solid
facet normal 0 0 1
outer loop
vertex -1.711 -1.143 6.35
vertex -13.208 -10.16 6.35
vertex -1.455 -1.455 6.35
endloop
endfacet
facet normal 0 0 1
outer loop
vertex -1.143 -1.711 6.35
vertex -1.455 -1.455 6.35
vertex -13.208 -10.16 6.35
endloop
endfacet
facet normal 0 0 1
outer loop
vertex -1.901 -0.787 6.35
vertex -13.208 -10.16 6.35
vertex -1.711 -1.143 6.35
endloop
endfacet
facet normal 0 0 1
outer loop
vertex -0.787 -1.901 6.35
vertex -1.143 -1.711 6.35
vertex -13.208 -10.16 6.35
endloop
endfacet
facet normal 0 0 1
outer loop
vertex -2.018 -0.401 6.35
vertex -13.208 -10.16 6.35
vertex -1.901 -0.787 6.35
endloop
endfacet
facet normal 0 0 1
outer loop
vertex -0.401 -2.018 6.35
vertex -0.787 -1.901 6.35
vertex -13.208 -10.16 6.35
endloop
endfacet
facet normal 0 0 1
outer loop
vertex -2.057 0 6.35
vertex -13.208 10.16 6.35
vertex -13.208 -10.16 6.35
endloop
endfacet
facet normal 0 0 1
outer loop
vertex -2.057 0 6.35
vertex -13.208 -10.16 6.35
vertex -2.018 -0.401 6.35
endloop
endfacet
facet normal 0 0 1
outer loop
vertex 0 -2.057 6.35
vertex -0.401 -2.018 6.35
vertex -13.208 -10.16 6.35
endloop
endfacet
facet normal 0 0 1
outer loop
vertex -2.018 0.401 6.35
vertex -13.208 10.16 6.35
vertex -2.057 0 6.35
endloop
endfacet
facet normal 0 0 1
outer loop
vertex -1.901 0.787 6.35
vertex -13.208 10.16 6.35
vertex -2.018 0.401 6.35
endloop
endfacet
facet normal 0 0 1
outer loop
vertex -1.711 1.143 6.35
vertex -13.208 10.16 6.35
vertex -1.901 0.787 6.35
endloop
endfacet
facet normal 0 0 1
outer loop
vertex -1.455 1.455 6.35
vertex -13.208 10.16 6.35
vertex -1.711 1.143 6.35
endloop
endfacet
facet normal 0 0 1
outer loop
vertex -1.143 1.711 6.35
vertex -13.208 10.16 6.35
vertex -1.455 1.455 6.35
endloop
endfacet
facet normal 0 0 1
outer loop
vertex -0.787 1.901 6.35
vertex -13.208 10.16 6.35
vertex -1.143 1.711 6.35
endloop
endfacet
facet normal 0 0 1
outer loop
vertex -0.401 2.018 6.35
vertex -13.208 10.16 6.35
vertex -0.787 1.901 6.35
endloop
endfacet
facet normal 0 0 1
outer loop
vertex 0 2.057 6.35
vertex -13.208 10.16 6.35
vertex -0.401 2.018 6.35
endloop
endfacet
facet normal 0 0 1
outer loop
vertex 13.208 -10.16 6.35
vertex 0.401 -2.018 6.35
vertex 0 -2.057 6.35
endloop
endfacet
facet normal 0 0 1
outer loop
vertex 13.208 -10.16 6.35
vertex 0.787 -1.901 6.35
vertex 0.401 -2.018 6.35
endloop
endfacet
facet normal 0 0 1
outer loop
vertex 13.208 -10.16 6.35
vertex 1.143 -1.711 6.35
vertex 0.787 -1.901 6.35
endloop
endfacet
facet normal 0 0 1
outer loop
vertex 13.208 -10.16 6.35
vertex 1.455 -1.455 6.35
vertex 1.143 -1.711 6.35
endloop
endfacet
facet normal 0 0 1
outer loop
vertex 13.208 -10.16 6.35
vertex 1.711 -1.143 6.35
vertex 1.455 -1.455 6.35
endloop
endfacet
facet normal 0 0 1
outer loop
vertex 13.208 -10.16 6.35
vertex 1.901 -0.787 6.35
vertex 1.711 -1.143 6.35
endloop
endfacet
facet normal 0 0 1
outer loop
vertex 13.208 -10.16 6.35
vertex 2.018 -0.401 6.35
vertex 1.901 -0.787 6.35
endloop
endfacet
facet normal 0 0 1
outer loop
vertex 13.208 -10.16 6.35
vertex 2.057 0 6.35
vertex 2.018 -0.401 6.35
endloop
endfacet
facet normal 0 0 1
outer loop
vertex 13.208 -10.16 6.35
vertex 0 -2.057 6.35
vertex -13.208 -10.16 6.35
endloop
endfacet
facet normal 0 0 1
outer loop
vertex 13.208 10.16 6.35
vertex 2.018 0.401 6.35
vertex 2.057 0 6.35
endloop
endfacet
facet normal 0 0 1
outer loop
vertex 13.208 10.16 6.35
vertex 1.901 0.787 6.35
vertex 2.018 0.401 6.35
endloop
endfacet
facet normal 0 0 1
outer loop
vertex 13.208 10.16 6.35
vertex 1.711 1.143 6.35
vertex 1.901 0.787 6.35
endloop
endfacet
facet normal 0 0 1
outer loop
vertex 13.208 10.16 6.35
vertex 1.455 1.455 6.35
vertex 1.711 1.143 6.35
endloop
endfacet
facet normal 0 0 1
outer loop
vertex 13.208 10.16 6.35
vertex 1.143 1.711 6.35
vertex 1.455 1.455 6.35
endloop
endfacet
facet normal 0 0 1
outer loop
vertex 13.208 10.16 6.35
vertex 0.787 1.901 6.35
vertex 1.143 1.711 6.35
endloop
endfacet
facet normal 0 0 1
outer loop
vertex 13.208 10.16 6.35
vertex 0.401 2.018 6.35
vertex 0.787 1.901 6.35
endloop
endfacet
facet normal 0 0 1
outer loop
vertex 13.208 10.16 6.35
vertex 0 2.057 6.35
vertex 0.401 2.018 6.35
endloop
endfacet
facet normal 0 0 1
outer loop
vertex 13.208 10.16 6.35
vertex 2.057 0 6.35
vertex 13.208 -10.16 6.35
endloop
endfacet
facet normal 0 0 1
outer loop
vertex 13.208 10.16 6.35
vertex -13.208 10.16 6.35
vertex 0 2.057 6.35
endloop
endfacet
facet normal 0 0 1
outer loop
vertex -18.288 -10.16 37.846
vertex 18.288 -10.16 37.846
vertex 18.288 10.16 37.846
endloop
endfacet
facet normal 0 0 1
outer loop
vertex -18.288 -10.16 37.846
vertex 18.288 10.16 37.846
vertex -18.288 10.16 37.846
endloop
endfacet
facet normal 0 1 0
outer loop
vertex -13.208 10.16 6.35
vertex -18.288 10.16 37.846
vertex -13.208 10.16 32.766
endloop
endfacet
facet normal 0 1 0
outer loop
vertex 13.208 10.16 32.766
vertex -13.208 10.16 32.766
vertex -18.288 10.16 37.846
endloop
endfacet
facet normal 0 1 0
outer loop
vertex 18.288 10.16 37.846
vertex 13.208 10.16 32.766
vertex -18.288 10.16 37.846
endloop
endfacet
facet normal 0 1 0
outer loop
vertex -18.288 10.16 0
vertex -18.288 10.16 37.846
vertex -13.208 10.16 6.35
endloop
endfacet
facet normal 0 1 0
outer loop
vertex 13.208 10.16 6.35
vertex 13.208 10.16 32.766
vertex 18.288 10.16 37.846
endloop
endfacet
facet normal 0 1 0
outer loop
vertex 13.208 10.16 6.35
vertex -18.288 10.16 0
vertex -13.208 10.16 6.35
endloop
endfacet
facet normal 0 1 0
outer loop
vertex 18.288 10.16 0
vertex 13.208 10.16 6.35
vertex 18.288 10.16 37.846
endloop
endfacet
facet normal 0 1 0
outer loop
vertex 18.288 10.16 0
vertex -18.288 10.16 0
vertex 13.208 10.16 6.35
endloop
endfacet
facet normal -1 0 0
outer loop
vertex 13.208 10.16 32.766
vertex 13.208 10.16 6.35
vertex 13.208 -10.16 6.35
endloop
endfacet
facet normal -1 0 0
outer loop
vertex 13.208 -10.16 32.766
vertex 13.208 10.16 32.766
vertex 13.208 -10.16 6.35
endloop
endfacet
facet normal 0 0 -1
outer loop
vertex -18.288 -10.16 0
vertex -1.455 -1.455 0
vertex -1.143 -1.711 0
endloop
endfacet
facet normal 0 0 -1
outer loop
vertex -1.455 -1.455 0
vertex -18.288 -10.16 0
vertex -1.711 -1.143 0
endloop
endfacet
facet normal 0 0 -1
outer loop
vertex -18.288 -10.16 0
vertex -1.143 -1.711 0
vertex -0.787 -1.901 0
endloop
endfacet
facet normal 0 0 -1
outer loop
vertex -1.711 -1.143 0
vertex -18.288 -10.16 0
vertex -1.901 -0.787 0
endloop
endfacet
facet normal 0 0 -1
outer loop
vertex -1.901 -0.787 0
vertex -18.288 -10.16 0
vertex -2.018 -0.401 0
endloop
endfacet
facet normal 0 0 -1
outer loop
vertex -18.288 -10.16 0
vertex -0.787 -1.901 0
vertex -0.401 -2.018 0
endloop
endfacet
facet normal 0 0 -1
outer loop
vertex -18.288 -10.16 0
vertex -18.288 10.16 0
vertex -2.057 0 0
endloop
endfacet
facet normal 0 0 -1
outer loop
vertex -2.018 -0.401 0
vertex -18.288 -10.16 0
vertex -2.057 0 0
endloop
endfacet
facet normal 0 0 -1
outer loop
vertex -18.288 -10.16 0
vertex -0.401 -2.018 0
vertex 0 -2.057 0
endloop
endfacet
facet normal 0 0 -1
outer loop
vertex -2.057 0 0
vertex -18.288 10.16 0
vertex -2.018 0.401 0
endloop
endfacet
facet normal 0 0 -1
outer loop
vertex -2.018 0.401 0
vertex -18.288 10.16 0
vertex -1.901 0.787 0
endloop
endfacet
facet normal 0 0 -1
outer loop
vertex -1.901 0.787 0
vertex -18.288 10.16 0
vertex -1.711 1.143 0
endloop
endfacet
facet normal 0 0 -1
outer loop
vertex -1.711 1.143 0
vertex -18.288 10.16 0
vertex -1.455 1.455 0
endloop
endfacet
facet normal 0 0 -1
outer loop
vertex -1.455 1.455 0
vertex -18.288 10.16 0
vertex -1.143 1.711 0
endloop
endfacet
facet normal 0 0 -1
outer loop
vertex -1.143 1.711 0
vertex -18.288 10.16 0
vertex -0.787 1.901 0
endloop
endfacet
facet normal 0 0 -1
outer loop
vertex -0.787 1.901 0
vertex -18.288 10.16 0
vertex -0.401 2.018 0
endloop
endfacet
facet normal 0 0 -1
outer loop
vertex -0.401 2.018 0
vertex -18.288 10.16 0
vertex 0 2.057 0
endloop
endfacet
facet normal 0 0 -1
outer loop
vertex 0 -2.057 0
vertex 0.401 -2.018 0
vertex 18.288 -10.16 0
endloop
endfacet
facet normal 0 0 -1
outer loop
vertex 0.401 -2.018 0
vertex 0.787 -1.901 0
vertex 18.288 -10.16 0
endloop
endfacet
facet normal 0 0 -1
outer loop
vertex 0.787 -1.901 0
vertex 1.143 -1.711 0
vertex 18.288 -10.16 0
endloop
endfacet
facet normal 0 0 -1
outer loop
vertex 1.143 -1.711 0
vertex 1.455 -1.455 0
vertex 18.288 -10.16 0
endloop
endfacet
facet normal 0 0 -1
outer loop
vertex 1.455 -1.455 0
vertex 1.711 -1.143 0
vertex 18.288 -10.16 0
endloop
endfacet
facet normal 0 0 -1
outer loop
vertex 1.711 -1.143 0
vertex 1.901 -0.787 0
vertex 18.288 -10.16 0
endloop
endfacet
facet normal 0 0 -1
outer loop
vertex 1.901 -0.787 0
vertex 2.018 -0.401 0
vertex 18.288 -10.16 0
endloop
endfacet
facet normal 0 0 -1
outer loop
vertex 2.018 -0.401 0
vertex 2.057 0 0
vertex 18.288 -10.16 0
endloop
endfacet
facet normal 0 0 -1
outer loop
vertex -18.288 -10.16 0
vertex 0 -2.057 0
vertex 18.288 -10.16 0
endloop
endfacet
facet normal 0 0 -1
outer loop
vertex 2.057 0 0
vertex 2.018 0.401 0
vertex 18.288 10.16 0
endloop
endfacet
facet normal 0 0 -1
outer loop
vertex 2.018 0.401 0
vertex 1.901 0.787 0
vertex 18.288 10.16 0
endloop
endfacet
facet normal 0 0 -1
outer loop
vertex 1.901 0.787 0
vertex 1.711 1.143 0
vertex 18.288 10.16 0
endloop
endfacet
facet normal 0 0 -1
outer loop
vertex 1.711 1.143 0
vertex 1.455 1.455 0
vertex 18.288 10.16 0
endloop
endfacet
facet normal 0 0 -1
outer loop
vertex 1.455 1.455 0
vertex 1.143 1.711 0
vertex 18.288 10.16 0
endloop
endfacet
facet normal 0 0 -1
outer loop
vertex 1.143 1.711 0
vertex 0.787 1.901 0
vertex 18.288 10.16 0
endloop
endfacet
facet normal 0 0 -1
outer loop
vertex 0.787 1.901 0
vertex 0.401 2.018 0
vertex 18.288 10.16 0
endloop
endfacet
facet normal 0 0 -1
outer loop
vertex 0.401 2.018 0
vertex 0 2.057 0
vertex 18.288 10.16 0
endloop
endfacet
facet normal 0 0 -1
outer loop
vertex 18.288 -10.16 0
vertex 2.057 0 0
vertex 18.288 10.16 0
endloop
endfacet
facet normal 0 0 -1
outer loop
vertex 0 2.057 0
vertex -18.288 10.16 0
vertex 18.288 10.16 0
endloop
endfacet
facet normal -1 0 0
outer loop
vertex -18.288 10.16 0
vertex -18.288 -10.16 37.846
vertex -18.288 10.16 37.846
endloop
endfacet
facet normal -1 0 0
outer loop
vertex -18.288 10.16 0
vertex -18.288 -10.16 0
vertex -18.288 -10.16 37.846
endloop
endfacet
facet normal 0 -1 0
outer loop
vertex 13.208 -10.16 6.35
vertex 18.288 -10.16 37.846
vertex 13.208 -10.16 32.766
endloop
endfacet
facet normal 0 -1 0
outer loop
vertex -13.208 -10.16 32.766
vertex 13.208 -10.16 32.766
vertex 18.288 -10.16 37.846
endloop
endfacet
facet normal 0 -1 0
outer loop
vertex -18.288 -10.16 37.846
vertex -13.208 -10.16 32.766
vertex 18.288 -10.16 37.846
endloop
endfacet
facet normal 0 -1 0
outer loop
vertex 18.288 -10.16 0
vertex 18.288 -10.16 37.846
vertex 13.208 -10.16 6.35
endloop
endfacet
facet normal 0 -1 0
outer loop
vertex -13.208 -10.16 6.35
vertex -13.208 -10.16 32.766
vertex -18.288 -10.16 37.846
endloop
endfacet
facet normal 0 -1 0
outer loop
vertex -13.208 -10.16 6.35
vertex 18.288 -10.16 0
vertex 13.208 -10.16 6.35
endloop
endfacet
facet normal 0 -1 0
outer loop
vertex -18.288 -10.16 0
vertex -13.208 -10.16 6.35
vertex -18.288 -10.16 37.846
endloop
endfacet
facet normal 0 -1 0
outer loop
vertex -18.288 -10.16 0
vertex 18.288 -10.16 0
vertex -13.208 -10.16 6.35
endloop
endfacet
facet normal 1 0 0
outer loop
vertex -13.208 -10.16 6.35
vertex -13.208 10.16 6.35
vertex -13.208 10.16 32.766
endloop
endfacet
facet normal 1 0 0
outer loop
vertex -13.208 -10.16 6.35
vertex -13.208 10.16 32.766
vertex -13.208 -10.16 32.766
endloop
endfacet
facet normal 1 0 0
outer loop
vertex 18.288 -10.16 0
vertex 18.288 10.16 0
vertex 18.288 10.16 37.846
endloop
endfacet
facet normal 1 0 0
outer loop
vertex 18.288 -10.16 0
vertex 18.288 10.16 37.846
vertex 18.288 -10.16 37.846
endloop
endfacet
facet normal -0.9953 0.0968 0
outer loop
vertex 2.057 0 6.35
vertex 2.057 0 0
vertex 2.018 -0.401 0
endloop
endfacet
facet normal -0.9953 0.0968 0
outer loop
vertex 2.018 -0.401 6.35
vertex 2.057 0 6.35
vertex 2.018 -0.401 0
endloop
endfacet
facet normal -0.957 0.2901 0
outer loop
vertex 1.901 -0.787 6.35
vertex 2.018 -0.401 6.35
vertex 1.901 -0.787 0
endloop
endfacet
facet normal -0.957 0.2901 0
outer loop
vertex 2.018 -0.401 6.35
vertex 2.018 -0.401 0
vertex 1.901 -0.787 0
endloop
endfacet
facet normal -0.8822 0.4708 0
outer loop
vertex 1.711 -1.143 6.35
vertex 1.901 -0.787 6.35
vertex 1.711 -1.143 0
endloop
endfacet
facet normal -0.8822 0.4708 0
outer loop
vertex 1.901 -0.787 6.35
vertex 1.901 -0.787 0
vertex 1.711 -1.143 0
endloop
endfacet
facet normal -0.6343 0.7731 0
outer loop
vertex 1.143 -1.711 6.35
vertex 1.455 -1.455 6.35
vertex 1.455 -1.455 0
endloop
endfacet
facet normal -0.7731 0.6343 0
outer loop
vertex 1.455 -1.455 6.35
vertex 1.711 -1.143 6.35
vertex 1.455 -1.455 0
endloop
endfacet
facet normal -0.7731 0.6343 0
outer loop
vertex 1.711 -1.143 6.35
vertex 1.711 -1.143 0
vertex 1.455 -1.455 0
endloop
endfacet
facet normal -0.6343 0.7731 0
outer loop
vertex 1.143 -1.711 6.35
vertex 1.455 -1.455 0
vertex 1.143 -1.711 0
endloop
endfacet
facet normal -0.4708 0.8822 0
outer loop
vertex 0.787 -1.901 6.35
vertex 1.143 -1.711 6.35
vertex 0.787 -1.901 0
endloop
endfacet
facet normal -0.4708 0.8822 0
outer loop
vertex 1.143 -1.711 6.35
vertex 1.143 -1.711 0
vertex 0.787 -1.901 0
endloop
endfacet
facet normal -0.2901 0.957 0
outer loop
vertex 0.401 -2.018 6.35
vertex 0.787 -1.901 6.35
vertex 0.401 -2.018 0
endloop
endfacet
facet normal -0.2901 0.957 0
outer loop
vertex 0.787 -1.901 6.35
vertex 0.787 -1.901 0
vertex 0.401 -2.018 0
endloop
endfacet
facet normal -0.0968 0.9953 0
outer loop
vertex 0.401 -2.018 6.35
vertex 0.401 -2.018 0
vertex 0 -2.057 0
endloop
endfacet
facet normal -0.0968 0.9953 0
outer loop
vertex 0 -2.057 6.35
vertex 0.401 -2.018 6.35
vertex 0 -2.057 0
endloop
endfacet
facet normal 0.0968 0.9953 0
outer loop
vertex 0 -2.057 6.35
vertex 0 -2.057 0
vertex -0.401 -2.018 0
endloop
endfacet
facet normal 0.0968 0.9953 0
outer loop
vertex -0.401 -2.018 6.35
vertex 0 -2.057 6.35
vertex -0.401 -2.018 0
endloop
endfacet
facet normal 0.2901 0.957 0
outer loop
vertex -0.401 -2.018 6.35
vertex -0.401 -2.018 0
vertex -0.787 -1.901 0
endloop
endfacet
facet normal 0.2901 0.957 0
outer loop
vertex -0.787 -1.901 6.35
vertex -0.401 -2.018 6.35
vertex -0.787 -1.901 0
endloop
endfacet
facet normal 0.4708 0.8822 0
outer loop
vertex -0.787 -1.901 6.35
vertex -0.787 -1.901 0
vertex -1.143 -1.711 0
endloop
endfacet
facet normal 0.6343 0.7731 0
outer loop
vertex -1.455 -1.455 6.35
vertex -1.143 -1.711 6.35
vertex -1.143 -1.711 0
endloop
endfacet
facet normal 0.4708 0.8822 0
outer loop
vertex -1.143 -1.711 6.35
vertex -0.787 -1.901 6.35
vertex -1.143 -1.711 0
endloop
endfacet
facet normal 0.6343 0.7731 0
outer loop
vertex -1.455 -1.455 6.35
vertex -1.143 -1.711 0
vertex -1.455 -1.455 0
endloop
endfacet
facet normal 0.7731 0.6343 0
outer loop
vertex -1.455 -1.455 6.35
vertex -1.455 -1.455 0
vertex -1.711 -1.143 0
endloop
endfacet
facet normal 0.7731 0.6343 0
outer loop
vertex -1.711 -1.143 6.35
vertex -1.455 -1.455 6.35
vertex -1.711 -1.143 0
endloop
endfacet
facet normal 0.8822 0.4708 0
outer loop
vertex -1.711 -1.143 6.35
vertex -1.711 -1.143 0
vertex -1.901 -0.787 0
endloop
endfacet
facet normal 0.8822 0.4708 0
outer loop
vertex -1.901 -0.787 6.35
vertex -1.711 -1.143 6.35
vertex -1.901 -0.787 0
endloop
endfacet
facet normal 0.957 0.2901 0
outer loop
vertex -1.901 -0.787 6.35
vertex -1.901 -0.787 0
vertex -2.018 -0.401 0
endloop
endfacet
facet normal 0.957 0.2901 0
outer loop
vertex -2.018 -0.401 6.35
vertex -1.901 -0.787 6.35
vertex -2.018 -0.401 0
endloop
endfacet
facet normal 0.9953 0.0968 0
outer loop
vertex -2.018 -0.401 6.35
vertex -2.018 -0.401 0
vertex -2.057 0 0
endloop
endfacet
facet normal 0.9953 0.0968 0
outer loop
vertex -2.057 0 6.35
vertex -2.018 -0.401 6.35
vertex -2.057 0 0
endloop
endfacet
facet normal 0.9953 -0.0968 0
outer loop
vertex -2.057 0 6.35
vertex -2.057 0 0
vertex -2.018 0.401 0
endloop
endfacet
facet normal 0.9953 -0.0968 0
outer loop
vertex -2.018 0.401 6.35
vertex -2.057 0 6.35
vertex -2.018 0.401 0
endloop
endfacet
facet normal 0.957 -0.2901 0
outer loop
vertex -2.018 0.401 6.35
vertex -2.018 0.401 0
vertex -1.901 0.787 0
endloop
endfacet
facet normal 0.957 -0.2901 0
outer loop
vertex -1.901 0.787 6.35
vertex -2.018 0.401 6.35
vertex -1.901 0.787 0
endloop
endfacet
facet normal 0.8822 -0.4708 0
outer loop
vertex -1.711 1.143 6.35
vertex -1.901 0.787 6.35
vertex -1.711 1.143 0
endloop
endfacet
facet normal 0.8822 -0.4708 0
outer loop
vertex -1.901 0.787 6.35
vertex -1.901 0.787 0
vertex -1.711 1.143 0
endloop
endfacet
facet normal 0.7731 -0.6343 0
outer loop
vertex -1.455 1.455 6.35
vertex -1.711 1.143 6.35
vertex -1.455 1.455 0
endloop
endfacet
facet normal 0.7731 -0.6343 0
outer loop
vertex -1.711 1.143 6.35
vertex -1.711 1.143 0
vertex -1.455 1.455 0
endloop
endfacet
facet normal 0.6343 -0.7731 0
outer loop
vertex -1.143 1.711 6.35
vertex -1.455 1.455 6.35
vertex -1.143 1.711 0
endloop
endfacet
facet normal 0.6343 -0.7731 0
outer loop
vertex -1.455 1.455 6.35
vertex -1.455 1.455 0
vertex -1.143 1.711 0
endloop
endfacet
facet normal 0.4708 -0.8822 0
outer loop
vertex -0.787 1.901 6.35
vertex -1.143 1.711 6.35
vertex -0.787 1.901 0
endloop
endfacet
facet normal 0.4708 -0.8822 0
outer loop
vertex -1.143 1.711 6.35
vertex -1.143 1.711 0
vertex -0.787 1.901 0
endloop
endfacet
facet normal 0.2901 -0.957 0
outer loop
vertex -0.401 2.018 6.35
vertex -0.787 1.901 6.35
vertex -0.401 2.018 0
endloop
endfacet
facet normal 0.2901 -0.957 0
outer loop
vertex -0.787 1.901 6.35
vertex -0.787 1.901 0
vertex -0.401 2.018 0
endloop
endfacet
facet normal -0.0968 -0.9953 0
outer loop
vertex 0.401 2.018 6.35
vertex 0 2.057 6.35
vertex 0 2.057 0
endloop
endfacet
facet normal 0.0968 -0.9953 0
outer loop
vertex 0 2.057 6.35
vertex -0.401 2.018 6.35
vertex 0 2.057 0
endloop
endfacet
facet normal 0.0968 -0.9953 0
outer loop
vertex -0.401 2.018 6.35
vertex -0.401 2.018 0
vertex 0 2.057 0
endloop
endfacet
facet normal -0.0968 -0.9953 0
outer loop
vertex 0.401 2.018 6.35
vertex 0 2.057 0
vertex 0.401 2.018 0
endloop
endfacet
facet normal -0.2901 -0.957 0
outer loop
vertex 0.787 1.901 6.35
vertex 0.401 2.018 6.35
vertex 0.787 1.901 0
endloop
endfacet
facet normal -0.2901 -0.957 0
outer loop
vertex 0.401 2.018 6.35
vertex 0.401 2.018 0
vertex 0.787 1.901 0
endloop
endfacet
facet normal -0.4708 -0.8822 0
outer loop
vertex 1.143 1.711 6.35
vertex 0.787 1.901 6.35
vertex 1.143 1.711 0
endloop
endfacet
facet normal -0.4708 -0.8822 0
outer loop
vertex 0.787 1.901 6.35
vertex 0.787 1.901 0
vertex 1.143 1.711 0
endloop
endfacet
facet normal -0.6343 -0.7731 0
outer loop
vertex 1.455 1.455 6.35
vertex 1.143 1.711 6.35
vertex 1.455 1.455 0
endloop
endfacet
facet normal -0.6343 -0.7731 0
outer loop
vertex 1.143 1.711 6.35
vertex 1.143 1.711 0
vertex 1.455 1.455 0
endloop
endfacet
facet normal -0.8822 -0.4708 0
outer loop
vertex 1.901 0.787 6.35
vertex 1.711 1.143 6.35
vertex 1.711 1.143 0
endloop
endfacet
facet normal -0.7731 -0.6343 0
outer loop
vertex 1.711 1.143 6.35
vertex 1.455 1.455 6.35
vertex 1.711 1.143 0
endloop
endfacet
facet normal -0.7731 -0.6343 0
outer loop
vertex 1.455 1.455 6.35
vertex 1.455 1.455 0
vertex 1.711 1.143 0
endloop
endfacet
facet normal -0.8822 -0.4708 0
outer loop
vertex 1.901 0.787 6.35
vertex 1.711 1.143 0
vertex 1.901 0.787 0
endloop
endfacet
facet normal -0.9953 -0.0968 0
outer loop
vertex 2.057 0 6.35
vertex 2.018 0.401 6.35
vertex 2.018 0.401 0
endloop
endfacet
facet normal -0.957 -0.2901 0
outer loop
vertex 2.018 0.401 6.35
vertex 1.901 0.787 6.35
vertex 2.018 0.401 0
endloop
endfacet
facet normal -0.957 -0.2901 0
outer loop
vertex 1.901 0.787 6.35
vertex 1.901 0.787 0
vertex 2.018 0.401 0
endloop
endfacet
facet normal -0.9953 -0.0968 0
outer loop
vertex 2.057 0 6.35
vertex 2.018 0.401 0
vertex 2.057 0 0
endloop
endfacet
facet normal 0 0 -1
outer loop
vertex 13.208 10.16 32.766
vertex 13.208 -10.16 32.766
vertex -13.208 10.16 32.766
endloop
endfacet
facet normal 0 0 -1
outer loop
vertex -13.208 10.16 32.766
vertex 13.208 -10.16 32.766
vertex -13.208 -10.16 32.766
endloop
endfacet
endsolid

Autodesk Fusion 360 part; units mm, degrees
sketch "Sketch1" plane through (0, 0, 0) normal (0, 0, 1) x (1, 0, 0)
  line L0 (18.288, -10.16) -> (-18.288, -10.16)
  line L1 (-18.288, -10.16) -> (-18.288, 10.16)
  line L2 (-18.288, 10.16) -> (18.288, 10.16)
  line L3 (18.288, 10.16) -> (18.288, -10.16)
  line L4 (18.288, -10.16) -> (-18.288, 10.16) construction
  line L5 (-18.288, -10.16) -> (18.288, 10.16) construction
  circle A0 centre (0, 0) radius 2.0574
  dimension "d1" = 36.576
  dimension "d2" = 20.32
  dimension "d3" = 4.1148
extrude "Extrude1" add sketch "Sketch1" along normal blind 6.35
sketch "Sketch2" plane through (0, 0, 6.35) normal (0, 0, 1) x (-1, 0, 0)
  circle A0 centre (0, 0) radius 2.0574
  line L0 (-18.288, -10.16) -> (18.288, -10.16)
  line L1 (18.288, -10.16) -> (18.288, 10.16)
  line L2 (18.288, 10.16) -> (-18.288, 10.16)
  line L3 (-18.288, 10.16) -> (-18.288, -10.16)
  line L4 (18.288, -10.16) -> (13.208, -10.16)
  line L5 (13.208, -10.16) -> (13.208, 10.16)
  line L6 (13.208, 10.16) -> (18.288, 10.16)
  line L7 (18.288, -10.16) -> (18.288, 10.16)
  line L8 (-18.288, -10.16) -> (-13.208, -10.16)
  line L9 (-13.208, -10.16) -> (-13.208, 10.16)
  line L10 (-13.208, 10.16) -> (-18.288, 10.16)
  line L11 (-18.288, -10.16) -> (-18.288, 10.16)
  dimension "d6" = 5.08
  dimension "d7" = 5.08
extrude "Extrude2" add sketch "Sketch2" along normal blind 26.416 contours L0 L2 L3 L8 L9 L10 L11 | L0 L1 L2 L4 L5 L6 L7
sketch "Sketch3" plane through (0, 0, 32.766) normal (0, 0, 1) x (-1, 0, 0)
  line L0 (13.208, -10.16) -> (18.288, -10.16)
  line L1 (18.288, -10.16) -> (18.288, 10.16)
  line L2 (18.288, 10.16) -> (13.208, 10.16)
  line L3 (13.208, 10.16) -> (13.208, -10.16)
  line L4 (18.288, -10.16) -> (-18.288, -10.16)
  line L5 (-18.288, -10.16) -> (-18.288, 10.16)
  line L6 (-18.288, 10.16) -> (18.288, 10.16)
  line L7 (18.288, 10.16) -> (18.288, -10.16)
  point P0 (-18.288, 10.16)
  dimension "d10" = 20.32
  dimension "d11" = 36.576
extrude "Extrude3" add sketch "Sketch3" along normal blind 5.08
